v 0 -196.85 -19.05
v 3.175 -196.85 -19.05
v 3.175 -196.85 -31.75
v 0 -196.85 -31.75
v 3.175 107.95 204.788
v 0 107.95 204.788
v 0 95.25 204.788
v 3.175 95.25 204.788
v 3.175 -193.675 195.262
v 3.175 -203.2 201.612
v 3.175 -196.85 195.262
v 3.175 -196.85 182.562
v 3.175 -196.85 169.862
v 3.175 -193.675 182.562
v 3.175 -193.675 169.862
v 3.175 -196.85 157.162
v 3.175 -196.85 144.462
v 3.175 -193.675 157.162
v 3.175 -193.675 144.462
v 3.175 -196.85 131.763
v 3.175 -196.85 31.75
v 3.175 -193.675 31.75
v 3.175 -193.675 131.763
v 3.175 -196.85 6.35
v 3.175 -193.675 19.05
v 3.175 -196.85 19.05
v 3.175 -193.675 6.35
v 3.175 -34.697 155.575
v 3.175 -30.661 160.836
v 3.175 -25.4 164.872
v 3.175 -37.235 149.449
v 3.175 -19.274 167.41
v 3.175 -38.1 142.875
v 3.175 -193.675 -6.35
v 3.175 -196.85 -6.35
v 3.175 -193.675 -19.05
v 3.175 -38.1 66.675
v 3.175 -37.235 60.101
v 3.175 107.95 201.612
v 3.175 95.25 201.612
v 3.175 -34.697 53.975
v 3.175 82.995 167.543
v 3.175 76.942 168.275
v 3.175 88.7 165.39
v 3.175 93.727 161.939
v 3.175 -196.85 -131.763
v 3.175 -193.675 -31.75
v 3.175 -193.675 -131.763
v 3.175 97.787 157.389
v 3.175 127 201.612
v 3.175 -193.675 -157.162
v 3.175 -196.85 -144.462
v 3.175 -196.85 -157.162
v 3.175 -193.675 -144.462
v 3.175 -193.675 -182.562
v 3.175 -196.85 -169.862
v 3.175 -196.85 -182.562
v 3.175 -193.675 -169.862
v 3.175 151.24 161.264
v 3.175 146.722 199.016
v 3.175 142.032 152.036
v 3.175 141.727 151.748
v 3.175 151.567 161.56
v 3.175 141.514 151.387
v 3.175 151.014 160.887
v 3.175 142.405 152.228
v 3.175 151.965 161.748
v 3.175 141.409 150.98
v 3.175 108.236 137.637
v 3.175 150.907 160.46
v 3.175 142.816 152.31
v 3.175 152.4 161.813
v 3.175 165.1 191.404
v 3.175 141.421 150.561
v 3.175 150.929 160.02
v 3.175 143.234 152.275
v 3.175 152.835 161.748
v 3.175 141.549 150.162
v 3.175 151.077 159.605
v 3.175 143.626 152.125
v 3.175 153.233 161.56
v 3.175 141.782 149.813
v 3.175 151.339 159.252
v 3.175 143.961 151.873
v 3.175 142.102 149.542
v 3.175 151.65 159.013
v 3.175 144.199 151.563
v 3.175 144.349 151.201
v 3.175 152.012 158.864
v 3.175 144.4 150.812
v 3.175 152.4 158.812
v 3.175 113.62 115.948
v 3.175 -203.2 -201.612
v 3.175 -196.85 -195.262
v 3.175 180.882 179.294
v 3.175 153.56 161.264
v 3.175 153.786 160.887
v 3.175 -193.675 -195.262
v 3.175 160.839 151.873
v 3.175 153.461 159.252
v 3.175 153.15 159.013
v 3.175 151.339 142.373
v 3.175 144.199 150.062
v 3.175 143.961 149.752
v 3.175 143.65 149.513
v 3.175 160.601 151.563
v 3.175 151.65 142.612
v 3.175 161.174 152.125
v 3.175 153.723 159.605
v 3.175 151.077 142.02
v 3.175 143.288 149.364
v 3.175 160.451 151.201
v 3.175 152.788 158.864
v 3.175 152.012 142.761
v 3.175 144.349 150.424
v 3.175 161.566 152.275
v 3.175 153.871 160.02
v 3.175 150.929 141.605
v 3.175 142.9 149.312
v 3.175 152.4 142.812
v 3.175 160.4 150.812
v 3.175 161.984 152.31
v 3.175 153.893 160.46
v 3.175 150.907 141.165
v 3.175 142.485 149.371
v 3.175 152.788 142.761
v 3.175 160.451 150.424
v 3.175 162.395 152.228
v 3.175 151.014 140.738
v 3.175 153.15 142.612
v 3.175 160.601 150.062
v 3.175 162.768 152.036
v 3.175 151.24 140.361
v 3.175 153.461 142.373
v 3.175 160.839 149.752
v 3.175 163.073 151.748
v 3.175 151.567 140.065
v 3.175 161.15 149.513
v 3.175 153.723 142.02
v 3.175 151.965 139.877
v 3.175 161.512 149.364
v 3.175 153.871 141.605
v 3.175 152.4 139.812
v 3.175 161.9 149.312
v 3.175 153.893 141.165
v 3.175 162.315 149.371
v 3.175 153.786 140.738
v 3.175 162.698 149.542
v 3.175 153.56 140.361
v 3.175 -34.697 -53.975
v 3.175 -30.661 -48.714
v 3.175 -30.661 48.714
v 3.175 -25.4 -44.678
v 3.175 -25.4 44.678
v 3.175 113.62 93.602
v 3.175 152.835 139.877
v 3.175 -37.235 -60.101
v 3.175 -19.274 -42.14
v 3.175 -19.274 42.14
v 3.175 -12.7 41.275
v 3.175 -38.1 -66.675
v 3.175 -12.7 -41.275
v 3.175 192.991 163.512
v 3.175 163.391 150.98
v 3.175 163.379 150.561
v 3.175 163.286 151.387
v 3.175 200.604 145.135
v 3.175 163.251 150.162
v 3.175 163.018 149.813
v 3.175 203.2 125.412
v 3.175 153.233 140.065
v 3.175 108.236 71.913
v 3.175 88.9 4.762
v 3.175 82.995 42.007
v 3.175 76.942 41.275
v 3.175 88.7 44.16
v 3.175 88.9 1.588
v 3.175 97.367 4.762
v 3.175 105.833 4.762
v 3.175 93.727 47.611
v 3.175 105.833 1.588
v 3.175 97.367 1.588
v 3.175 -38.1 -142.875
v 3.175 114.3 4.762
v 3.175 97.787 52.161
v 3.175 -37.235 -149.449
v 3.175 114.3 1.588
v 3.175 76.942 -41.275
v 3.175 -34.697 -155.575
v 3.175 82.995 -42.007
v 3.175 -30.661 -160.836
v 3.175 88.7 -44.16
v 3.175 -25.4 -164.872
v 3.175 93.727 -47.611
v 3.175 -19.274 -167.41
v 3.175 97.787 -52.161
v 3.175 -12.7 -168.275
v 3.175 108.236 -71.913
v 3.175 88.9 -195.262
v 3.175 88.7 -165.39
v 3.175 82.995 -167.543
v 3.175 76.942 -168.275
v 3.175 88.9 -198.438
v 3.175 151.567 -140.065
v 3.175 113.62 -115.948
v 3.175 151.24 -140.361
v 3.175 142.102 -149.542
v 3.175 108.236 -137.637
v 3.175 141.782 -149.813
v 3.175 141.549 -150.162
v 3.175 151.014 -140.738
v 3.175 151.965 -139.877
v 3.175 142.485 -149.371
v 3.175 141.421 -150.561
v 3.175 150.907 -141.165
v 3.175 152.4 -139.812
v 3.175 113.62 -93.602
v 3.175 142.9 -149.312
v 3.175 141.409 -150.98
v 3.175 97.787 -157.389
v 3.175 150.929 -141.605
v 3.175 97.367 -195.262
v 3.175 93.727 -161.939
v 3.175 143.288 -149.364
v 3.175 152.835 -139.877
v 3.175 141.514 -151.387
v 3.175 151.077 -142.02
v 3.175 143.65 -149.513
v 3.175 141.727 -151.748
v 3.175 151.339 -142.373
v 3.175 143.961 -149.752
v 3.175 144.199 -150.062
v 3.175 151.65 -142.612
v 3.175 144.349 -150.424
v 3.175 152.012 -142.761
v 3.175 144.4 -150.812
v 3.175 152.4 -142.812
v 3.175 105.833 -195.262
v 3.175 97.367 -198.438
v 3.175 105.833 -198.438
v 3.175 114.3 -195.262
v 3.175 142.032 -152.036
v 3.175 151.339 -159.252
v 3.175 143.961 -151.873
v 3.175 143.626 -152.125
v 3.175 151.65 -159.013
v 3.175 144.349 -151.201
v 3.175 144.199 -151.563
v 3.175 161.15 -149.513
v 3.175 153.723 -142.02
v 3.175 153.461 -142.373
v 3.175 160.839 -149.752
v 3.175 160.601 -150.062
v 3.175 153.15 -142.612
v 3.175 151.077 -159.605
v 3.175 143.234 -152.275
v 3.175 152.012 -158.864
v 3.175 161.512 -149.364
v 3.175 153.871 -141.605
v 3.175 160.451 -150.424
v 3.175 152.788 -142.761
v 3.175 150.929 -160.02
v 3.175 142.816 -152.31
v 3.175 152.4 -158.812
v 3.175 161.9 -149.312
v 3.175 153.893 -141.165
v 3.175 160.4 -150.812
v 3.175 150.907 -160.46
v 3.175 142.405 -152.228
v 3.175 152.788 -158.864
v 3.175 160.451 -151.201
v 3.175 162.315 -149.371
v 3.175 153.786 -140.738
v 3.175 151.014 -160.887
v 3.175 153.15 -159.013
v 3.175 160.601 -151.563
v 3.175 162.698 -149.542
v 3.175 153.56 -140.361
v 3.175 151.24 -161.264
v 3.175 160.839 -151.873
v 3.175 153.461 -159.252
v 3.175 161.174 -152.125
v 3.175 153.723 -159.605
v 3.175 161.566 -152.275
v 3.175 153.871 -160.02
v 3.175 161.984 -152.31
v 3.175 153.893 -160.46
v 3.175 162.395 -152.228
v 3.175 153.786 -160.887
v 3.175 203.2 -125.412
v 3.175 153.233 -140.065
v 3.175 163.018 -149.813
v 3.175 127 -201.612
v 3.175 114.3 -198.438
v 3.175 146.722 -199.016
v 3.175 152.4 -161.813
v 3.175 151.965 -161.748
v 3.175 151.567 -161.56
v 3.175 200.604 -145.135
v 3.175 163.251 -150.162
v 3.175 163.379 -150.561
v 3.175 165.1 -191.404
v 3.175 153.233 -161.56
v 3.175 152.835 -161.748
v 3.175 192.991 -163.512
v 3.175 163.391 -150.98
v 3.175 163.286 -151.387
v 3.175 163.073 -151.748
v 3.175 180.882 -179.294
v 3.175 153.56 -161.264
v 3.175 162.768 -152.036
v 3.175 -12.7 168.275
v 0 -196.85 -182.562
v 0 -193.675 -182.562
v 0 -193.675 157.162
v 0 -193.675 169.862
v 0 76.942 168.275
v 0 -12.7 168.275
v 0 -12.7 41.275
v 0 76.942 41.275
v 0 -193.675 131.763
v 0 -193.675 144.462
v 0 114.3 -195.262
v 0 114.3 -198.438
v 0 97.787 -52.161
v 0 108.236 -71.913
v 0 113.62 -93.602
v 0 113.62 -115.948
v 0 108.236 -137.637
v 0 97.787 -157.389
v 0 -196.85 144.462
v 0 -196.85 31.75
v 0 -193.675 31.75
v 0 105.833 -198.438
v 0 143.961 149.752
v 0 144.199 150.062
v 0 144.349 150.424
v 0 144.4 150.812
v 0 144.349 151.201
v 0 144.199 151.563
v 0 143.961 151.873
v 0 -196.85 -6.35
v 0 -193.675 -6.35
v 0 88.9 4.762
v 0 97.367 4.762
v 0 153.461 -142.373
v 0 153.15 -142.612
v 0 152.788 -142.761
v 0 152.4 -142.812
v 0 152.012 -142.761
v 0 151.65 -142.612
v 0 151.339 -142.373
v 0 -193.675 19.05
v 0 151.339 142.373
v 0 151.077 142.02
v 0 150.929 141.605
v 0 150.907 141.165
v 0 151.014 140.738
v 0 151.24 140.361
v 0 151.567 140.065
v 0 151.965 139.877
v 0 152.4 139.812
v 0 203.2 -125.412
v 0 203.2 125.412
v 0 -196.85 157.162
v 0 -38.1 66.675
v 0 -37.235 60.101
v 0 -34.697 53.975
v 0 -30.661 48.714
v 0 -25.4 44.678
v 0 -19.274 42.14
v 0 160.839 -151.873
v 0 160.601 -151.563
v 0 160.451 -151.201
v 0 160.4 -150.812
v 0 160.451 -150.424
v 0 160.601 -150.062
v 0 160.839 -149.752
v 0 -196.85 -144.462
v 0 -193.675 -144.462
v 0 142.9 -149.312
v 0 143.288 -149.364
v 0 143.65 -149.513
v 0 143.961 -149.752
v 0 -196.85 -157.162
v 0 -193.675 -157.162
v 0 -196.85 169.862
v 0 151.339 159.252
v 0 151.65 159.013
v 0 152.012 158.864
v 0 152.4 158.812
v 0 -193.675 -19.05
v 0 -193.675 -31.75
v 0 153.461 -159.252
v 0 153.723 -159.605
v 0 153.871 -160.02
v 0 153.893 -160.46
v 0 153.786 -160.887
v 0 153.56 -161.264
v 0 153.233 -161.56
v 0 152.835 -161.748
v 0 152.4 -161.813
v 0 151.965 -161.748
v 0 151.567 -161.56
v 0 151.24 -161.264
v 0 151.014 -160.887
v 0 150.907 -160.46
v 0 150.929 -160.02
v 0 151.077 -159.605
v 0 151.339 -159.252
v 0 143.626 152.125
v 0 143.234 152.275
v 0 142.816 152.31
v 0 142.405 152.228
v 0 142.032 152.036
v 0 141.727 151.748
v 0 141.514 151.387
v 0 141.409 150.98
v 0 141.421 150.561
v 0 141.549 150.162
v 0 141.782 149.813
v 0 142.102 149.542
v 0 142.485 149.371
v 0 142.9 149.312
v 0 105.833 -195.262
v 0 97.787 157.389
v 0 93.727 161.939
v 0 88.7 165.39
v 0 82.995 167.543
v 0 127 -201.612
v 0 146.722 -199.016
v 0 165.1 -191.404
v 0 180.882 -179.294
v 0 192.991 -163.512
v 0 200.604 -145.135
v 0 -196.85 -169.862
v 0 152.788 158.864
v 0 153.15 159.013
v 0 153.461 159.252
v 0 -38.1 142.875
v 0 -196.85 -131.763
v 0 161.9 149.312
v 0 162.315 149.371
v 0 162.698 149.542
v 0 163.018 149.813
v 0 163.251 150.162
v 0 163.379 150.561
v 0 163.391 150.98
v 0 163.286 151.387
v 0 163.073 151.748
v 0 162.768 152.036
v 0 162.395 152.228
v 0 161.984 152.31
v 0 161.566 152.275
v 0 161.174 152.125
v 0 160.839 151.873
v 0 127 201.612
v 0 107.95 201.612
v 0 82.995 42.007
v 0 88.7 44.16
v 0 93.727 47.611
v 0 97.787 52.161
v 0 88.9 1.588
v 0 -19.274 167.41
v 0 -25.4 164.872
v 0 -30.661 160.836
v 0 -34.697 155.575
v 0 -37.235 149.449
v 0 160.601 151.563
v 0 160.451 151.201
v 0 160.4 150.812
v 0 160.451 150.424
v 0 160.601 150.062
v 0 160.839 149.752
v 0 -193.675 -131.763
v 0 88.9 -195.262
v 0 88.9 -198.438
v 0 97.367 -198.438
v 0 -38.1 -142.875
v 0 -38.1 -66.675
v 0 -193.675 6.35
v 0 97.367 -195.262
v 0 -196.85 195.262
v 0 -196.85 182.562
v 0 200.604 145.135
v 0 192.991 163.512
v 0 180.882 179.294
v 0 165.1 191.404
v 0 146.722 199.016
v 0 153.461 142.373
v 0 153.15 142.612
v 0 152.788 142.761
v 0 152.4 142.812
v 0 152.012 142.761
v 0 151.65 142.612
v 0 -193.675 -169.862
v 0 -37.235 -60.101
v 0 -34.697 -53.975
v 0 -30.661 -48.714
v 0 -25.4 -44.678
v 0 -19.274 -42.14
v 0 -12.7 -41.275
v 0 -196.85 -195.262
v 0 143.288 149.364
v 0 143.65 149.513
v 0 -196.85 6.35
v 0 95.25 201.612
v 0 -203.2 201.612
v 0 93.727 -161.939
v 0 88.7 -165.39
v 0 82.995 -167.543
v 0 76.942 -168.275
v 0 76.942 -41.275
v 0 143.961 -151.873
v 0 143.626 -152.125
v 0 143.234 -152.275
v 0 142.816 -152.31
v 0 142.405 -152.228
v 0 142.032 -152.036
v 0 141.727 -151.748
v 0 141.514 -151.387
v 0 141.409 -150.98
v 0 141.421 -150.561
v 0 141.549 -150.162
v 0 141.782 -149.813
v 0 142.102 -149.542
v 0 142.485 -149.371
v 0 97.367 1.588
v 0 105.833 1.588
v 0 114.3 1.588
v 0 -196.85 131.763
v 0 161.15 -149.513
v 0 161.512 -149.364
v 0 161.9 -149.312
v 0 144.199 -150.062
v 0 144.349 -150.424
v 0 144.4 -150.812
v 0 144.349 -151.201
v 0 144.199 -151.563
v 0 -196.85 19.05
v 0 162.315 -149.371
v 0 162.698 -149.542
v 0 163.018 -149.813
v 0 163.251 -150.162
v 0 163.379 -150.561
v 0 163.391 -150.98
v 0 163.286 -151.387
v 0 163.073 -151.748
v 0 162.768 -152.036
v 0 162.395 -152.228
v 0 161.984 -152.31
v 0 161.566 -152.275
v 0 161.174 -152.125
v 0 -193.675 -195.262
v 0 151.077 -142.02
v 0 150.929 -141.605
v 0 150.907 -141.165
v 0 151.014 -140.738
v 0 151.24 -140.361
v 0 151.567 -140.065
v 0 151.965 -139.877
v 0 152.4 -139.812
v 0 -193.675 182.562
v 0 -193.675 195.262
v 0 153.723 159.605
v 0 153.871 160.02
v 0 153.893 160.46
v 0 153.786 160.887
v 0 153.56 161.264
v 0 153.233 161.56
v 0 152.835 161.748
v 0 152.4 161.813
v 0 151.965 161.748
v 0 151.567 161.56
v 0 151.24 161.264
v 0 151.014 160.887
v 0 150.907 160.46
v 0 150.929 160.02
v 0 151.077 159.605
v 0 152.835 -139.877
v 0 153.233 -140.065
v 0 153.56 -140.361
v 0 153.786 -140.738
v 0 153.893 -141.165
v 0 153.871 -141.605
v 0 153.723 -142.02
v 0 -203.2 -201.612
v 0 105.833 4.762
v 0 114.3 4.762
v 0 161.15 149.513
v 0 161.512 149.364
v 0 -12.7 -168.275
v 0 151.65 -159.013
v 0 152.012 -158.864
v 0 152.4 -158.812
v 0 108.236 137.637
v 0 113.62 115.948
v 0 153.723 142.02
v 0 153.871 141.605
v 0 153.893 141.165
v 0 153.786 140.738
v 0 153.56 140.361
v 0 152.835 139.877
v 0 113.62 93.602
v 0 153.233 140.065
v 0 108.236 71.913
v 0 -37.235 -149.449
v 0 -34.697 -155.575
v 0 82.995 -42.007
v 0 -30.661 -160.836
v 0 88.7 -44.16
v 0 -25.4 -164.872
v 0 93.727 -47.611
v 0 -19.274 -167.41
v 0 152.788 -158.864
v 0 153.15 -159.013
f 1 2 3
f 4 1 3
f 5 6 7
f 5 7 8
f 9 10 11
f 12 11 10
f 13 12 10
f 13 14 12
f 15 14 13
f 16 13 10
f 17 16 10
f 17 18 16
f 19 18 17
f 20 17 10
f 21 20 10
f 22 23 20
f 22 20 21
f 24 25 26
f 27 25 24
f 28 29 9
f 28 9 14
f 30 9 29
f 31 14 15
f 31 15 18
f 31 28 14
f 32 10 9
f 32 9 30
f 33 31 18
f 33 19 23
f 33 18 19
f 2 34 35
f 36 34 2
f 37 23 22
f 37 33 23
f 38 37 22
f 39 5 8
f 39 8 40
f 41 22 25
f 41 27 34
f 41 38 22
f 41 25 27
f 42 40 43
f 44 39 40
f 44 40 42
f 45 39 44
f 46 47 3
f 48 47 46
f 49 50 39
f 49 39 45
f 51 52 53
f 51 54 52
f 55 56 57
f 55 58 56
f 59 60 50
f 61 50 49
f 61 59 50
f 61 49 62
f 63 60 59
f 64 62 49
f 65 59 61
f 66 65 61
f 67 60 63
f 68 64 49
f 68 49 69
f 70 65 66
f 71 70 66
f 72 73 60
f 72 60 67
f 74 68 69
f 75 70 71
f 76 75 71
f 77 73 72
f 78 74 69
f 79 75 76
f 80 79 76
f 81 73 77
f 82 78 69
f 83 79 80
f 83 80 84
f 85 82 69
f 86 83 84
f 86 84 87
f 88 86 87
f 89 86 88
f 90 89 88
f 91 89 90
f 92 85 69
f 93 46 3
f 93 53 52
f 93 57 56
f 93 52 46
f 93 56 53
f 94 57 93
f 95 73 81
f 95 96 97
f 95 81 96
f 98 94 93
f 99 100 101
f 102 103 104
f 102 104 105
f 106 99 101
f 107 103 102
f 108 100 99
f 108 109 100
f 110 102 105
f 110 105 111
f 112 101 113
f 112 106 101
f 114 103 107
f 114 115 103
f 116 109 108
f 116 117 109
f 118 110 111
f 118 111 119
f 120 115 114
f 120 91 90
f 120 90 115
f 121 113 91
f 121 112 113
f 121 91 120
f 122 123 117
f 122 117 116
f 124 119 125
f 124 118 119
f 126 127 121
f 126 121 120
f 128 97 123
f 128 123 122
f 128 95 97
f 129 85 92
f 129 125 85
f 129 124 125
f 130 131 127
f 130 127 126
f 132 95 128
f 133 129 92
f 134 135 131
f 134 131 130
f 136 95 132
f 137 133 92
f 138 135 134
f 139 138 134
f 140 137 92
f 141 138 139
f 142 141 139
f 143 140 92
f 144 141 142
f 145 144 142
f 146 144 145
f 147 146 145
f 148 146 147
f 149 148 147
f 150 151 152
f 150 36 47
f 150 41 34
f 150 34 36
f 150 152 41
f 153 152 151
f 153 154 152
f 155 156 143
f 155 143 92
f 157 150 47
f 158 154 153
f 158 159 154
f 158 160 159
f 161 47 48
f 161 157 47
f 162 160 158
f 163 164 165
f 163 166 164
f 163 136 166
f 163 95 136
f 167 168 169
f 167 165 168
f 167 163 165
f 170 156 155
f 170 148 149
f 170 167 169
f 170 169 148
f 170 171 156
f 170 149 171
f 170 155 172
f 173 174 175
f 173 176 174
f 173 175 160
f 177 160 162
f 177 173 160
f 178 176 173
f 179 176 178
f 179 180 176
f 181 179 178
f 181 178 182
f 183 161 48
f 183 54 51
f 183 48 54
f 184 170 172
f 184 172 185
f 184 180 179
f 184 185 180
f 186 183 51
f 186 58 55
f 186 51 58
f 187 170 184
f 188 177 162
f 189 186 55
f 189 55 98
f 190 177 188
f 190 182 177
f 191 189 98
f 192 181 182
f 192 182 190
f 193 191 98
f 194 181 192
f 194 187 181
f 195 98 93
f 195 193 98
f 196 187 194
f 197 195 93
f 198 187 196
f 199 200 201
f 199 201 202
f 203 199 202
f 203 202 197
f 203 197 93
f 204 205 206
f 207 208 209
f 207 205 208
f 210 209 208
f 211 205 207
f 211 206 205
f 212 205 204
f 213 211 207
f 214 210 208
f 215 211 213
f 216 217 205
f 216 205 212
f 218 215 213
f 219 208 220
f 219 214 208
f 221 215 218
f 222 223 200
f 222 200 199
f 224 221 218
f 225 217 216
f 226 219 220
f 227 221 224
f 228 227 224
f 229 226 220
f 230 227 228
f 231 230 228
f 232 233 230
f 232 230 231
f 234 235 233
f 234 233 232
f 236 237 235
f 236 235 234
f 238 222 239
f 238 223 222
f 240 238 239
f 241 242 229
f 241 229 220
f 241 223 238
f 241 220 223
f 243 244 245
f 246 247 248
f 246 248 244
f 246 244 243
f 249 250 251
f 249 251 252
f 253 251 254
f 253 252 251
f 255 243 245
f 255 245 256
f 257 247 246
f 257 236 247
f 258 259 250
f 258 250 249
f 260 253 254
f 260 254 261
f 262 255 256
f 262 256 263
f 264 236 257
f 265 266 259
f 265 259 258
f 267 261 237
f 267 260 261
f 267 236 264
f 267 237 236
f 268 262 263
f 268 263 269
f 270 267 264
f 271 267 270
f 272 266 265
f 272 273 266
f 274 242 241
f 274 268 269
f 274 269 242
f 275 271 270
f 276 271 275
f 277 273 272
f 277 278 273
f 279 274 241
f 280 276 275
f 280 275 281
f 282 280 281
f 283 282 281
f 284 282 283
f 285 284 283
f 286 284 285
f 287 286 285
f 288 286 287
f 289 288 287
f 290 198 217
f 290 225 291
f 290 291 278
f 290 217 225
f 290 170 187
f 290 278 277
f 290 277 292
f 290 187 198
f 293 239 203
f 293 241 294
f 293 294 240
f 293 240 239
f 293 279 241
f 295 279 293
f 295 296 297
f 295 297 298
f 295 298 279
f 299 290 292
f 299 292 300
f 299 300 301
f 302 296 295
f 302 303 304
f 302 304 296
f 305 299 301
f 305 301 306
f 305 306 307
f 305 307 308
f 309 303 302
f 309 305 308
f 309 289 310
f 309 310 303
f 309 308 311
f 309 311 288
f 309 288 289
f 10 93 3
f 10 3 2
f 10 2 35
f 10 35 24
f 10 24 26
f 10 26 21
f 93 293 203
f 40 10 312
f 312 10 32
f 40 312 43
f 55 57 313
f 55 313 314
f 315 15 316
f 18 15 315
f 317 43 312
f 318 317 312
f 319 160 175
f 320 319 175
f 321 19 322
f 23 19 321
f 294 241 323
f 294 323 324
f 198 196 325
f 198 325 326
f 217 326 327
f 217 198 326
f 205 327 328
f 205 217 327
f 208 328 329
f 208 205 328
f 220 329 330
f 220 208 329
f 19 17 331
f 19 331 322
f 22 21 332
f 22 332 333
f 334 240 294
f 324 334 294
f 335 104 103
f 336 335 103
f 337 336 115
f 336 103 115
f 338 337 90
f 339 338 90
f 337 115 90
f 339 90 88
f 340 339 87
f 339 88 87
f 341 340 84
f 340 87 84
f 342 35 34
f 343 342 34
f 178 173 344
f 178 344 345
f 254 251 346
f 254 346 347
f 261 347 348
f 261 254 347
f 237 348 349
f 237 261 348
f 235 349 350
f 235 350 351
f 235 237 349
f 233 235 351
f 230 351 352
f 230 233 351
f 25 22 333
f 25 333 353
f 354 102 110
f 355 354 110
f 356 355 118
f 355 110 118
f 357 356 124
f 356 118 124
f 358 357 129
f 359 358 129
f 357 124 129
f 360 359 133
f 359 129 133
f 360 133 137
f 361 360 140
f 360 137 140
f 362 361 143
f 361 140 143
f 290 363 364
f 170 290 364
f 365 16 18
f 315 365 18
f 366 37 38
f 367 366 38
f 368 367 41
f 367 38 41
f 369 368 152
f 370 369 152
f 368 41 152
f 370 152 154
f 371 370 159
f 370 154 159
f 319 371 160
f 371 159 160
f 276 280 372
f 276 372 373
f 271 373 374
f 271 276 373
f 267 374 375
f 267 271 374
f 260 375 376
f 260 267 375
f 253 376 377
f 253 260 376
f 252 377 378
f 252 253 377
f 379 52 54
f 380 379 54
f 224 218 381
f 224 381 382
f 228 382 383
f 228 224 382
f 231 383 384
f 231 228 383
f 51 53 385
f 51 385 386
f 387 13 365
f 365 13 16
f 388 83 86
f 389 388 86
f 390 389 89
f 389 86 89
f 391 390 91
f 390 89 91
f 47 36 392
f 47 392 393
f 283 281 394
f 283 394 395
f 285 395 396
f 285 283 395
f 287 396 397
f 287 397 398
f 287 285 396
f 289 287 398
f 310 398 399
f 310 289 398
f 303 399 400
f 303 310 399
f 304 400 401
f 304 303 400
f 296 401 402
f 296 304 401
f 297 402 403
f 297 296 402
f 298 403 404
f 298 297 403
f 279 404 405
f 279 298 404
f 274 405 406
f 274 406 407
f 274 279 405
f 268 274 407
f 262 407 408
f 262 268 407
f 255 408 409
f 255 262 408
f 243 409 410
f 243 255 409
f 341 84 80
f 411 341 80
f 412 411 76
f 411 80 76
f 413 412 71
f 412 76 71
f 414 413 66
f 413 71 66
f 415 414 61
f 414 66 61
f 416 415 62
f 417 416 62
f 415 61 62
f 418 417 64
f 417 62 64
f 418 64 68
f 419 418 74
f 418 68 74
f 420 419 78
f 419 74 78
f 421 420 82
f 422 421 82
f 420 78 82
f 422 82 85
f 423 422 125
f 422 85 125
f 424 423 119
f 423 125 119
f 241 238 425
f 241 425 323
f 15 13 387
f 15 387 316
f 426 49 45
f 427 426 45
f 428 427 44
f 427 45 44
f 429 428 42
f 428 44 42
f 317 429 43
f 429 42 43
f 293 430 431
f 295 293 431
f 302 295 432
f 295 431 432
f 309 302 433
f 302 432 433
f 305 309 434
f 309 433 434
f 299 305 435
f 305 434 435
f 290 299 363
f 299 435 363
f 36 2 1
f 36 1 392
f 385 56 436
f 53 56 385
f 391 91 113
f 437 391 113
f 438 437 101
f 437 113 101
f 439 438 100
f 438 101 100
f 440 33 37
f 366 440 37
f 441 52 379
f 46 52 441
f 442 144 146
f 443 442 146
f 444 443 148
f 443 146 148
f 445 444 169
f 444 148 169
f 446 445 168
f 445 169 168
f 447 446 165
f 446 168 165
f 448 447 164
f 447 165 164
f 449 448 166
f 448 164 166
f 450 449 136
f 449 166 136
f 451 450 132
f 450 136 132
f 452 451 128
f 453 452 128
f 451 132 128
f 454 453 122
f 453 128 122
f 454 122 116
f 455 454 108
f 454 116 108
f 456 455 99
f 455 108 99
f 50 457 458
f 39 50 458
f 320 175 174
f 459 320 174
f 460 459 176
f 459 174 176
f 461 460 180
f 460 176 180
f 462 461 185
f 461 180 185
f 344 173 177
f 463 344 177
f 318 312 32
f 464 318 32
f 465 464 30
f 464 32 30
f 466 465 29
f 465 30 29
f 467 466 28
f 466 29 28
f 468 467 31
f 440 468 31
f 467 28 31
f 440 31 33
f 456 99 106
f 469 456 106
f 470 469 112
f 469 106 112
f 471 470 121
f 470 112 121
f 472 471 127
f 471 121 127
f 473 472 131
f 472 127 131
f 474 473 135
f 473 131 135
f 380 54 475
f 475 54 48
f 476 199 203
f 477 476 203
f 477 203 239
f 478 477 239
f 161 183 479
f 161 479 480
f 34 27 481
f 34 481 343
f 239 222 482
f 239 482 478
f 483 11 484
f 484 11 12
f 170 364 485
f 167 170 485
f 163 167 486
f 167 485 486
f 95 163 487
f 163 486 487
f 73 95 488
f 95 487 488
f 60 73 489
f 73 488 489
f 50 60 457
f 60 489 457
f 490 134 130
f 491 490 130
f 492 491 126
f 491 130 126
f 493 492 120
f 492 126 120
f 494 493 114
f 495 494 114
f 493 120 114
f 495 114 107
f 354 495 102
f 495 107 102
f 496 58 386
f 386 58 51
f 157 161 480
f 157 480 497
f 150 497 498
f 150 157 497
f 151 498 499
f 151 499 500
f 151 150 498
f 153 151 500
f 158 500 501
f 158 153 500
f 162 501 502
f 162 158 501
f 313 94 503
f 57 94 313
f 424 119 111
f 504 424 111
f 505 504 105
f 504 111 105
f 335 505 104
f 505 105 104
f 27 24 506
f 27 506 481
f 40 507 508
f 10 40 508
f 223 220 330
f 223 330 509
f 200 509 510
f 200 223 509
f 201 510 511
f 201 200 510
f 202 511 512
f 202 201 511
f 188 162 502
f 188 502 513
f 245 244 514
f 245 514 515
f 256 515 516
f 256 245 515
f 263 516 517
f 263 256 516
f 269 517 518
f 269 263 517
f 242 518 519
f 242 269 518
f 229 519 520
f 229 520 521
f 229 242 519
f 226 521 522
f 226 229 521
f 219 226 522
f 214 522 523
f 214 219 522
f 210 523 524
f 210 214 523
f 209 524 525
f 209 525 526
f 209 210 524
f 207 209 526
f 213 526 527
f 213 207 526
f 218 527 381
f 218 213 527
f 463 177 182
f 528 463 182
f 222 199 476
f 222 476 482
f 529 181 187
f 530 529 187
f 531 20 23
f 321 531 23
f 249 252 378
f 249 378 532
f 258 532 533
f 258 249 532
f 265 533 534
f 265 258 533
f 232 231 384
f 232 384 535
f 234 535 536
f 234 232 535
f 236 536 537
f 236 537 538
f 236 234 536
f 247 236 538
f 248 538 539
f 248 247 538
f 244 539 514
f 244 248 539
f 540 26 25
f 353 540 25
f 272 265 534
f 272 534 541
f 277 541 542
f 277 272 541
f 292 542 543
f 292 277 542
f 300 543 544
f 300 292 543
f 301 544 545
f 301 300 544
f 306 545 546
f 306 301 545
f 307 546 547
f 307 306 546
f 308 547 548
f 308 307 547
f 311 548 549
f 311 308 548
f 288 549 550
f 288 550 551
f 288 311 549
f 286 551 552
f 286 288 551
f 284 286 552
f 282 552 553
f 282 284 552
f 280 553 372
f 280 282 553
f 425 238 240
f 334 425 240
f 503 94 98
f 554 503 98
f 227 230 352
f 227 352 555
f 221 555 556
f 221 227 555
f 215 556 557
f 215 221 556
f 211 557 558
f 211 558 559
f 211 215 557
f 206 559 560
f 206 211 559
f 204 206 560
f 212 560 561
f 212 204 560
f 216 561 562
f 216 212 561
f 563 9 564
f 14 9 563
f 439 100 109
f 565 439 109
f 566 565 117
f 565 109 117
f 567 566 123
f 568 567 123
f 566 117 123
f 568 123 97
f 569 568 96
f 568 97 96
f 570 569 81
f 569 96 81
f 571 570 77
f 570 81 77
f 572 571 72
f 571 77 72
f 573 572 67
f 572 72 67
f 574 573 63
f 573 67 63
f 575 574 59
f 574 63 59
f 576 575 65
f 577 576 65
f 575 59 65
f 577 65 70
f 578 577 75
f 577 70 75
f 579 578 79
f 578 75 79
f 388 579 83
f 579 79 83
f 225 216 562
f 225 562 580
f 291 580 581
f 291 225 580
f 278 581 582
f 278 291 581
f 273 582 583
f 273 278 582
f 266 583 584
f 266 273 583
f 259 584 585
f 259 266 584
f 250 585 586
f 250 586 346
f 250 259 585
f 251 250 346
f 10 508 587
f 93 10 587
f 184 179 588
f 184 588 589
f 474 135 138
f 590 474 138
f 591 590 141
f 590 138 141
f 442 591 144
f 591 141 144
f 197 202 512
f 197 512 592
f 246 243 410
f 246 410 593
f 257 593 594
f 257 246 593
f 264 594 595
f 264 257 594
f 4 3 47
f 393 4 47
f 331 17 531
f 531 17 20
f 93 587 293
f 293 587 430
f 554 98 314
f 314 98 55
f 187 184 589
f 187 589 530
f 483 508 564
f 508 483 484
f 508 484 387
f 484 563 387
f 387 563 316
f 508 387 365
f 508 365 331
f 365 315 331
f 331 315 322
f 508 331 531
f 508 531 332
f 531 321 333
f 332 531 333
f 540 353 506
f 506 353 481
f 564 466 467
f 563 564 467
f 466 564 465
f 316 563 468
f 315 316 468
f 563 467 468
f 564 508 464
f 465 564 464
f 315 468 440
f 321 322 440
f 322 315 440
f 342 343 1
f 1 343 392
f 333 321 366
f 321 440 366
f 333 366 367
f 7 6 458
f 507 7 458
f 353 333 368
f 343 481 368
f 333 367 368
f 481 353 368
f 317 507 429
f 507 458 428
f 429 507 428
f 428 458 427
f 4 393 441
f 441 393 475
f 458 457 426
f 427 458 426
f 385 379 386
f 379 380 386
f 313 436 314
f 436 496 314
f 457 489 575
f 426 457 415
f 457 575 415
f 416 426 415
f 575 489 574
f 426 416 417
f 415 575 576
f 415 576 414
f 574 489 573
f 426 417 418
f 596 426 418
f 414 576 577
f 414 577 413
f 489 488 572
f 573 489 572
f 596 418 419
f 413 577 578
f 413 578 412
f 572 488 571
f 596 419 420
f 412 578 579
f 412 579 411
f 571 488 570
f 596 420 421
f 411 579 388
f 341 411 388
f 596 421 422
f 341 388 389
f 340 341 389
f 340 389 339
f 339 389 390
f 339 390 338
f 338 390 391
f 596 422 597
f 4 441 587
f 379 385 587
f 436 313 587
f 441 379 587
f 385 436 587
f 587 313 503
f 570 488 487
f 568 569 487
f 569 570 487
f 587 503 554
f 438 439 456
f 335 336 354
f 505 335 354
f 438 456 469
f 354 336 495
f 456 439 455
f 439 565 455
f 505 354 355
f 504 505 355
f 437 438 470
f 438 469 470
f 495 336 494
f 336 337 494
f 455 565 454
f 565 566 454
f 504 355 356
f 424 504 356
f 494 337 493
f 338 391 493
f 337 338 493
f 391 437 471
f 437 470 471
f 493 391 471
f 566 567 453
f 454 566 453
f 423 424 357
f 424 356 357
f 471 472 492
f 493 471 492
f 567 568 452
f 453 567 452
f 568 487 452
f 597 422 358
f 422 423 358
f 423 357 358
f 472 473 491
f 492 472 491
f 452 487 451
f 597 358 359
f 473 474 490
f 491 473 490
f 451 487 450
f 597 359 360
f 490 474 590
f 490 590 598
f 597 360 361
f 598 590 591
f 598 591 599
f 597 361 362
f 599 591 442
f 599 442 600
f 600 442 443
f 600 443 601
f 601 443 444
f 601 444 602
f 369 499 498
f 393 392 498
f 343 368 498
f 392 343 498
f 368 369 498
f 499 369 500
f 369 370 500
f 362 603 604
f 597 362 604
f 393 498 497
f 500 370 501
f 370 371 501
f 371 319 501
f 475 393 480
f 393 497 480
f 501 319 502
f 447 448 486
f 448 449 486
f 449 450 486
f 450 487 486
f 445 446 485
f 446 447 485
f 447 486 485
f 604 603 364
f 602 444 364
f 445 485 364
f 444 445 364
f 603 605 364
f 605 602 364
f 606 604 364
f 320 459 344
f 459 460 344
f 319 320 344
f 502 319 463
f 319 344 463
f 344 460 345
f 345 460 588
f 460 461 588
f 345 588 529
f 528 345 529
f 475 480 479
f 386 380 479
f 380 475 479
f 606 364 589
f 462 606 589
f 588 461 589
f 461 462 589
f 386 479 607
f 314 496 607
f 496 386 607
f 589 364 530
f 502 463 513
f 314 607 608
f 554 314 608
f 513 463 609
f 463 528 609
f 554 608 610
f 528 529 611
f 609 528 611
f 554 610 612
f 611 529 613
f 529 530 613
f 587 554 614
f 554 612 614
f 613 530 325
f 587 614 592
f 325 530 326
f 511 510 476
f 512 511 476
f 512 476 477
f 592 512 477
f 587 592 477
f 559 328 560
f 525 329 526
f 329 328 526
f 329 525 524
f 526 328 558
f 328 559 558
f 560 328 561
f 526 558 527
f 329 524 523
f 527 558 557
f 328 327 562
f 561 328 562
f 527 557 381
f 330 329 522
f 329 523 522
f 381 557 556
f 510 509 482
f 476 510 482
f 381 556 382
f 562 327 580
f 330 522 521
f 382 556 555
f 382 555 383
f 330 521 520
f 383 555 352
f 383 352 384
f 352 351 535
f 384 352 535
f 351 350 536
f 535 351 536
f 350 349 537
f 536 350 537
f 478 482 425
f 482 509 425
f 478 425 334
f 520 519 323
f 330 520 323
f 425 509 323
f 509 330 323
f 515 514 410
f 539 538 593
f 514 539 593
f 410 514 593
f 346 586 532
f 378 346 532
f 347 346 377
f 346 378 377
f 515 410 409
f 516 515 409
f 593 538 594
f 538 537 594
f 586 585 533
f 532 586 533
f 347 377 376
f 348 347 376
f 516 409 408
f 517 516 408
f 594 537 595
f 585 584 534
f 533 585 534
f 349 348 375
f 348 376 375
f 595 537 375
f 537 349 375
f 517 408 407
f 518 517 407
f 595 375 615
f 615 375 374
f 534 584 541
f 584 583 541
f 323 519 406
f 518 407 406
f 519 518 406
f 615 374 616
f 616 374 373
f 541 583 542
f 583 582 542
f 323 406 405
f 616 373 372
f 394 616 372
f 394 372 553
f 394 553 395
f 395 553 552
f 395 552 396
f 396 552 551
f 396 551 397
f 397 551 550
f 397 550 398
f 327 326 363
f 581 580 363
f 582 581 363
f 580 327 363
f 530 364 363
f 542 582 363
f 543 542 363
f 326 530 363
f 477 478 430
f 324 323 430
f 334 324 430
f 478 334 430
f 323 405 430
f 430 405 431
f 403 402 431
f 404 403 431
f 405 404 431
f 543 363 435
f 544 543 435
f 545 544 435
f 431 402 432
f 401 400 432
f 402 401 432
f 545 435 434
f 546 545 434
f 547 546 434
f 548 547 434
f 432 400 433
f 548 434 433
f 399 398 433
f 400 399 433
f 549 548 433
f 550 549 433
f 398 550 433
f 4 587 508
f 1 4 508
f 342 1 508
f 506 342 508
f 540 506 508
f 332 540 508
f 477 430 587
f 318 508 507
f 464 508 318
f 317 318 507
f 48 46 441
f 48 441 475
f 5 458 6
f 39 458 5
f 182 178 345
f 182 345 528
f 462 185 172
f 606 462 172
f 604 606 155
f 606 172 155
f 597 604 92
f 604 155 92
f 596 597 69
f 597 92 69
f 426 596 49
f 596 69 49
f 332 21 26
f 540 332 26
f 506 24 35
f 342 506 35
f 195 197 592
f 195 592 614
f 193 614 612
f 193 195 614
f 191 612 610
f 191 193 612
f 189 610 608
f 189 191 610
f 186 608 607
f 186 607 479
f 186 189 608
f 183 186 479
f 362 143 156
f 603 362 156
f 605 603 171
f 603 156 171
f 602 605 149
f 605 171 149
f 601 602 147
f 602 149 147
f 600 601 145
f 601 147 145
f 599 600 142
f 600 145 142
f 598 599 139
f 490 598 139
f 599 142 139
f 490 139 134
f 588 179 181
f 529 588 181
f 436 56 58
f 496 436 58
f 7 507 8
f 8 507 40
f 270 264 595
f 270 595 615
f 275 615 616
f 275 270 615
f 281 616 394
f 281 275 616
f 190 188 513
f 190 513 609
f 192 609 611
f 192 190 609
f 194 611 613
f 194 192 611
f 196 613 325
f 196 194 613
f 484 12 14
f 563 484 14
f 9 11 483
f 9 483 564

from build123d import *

# Parameters (mm, degrees)
BOSS_EXTRUDE1_DEPTH = 3.175
SKETCH2_W           = 3.175
SKETCH2_H           = 8.466666667
CUT_EXTRUDE1_DEPTH  = 3.175
SKETCH3_W           = 3.175
SKETCH3_H           = 12.7
BOSS_EXTRUDE2_DEPTH = 3.175
CUT_EXTRUDE2_DEPTH  = 3.175
SKETCH5_W           = 12.7
SKETCH5_H           = 3.175
CUT_EXTRUDE3_DEPTH  = 3.175
SKETCH6_W           = 12.7
SKETCH6_H           = 3.175
CUT_EXTRUDE4_DEPTH  = 3.175
CUT_EXTRUDE5_DEPTH  = 3.175


with BuildPart() as part:
    # Sketch1 → Boss-Extrude1 (new body)
    with BuildSketch(Plane(origin=(0, 0, 0), x_dir=(0, 0, -1), z_dir=(1, 0, 0))):
        with BuildLine():
            Line((-201.6125, -203.2), (201.6125, -203.2))
            Line((201.6125, -203.2), (201.6125, 127))
            ThreePointArc((201.6125, 127), (179.294036726, 180.881536726), (125.4125, 203.2))
            Line((125.4125, 203.2), (-125.4125, 203.2))
            ThreePointArc((-125.4125, 203.2), (-179.294036726, 180.881536726), (-201.6125, 127))
            Line((-201.6125, 127), (-201.6125, -203.2))
        make_face()
    extrude(amount=BOSS_EXTRUDE1_DEPTH)

    # Sketch2 → Cut-Extrude1 (cut)
    with BuildSketch(Plane(origin=(3.175, 0, 0), x_dir=(0, 0, -1), z_dir=(1, 0, 0))):
        with Locations((-3.175, 110.066666667)):
            Rectangle(SKETCH2_W, SKETCH2_H)
        with Locations((196.85, 110.066666667)):
            Rectangle(SKETCH2_W, SKETCH2_H)
        with Locations((196.85, 93.133333334)):
            Rectangle(SKETCH2_W, SKETCH2_H)
        with Locations((-3.175, 93.133333334)):
            Rectangle(SKETCH2_W, SKETCH2_H)
    extrude(amount=-CUT_EXTRUDE1_DEPTH, mode=Mode.SUBTRACT)

    # Sketch3 → Boss-Extrude2 (add)
    with BuildSketch(Plane.XY.offset(201.6125)):
        with Locations((1.5875, 101.6)):
            Rectangle(SKETCH3_W, SKETCH3_H)
    extrude(amount=BOSS_EXTRUDE2_DEPTH)

    # Sketch4 → Cut-Extrude2 (cut)
    with BuildSketch(Plane(origin=(3.175, 0, 0), x_dir=(0, 0, -1), z_dir=(1, 0, 0))):
        with BuildLine():
            Line((-168.275, 76.941959208), (-168.275, -12.7))
            ThreePointArc((-168.275, -12.7), (-160.835512242, -30.660512242), (-142.875, -38.1))
            Line((-142.875, -38.1), (-66.675, -38.1))
            ThreePointArc((-66.675, -38.1), (-48.714487758, -30.660512242), (-41.275, -12.7))
            Line((-41.275, -12.7), (-41.275, 76.941959208))
            ThreePointArc((-41.275, 76.941959208), (-44.160306385, 88.699874475), (-52.160714286, 97.786515097))
            ThreePointArc((-52.160714286, 97.786515097), (-104.775, 114.3), (-157.389285714, 97.786515097))
            ThreePointArc((-157.389285714, 97.786515097), (-165.389693615, 88.699874475), (-168.275, 76.941959208))
        make_face()
        with BuildLine():
            Line((168.275, 76.941959208), (168.275, -12.7))
            ThreePointArc((168.275, -12.7), (160.835512242, -30.660512242), (142.875, -38.1))
            Line((142.875, -38.1), (66.675, -38.1))
            ThreePointArc((66.675, -38.1), (48.714487758, -30.660512242), (41.275, -12.7))
            Line((41.275, -12.7), (41.275, 76.941959208))
            ThreePointArc((41.275, 76.941959208), (44.160306385, 88.699874475), (52.160714286, 97.786515097))
            ThreePointArc((52.160714286, 97.786515097), (104.775, 114.3), (157.389285714, 97.786515097))
            ThreePointArc((157.389285714, 97.786515097), (165.389693615, 88.699874475), (168.275, 76.941959208))
        make_face()
    extrude(amount=-CUT_EXTRUDE2_DEPTH, mode=Mode.SUBTRACT)

    # Sketch5 → Cut-Extrude3 (cut)
    with BuildSketch(Plane(origin=(3.175, 0, 0), x_dir=(0, 0, -1), z_dir=(1, 0, 0))):
        with Locations((-188.9125, -195.2625)):
            Rectangle(SKETCH5_W, SKETCH5_H)
        with Locations((-163.5125, -195.2625)):
            Rectangle(SKETCH5_W, SKETCH5_H)
        with Locations((-138.1125, -195.2625)):
            Rectangle(SKETCH5_W, SKETCH5_H)
    cut_extrude3 = extrude(amount=-CUT_EXTRUDE3_DEPTH, mode=Mode.SUBTRACT)

    # Mirror1: Cut-Extrude3 across plane
    add(cut_extrude3.mirror(Plane.XY), mode=Mode.SUBTRACT)

    # Sketch6 → Cut-Extrude4 (cut)
    with BuildSketch(Plane(origin=(3.175, 0, 0), x_dir=(0, 0, -1), z_dir=(1, 0, 0))):
        with Locations((-25.4, -195.2625)):
            Rectangle(SKETCH6_W, SKETCH6_H)
        with Locations((0, -195.2625)):
            Rectangle(SKETCH6_W, SKETCH6_H)
        with Locations((25.4, -195.2625)):
            Rectangle(SKETCH6_W, SKETCH6_H)
    extrude(amount=-CUT_EXTRUDE4_DEPTH, mode=Mode.SUBTRACT)

    # Sketch7 → Cut-Extrude5 (cut)
    with BuildSketch(Plane(origin=(3.175, 0, 0), x_dir=(0, 0, -1), z_dir=(1, 0, 0))):
        with BuildLine():
            ThreePointArc((-158.8125, 152.4), (-158.926680701, 152.974025149), (-159.251839828, 153.460660172))
            Line((-159.251839828, 153.460660172), (-160.3125, 152.4))
            Line((-160.3125, 152.4), (-159.251839828, 151.339339828))
            ThreePointArc((-159.251839828, 151.339339828), (-158.926680701, 151.825974851), (-158.8125, 152.4))
        make_face()
        with BuildLine():
            Line((-160.3125, 152.4), (-159.251839828, 153.460660172))
            ThreePointArc((-159.251839828, 153.460660172), (-161.8125, 152.4), (-159.251839828, 151.339339828))
            Line((-159.251839828, 151.339339828), (-160.3125, 152.4))
        make_face()
        with BuildLine():
            Line((-149.751839828, 160.839339828), (-150.8125, 161.9))
            Line((-150.8125, 161.9), (-151.873160172, 160.839339828))
            ThreePointArc((-151.873160172, 160.839339828), (-150.8125, 160.4), (-149.751839828, 160.839339828))
        make_face()
        with BuildLine():
            Line((-151.873160172, 160.839339828), (-150.8125, 161.9))
            Line((-150.8125, 161.9), (-149.751839828, 160.839339828))
            ThreePointArc((-149.751839828, 160.839339828), (-149.426680701, 161.325974851), (-149.3125, 161.9))
            ThreePointArc((-149.3125, 161.9), (-151.386525149, 163.285819299), (-151.873160172, 160.839339828))
        make_face()
        with BuildLine():
            ThreePointArc((-139.8125, 152.4), (-140.738474851, 153.785819299), (-142.373160172, 153.460660172))
            Line((-142.373160172, 153.460660172), (-141.3125, 152.4))
            Line((-141.3125, 152.4), (-142.373160172, 151.339339828))
            ThreePointArc((-142.373160172, 151.339339828), (-140.738474851, 151.014180701), (-139.8125, 152.4))
        make_face()
        with BuildLine():
            Line((-141.3125, 152.4), (-142.373160172, 153.460660172))
            ThreePointArc((-142.373160172, 153.460660172), (-142.8125, 152.4), (-142.373160172, 151.339339828))
            Line((-142.373160172, 151.339339828), (-141.3125, 152.4))
        make_face()
        with BuildLine():
            ThreePointArc((-149.751839828, 143.960660172), (-150.8125, 144.4), (-151.873160172, 143.960660172))
            Line((-151.873160172, 143.960660172), (-150.8125, 142.9))
            Line((-150.8125, 142.9), (-149.751839828, 143.960660172))
        make_face()
        with BuildLine():
            Line((-150.8125, 142.9), (-151.873160172, 143.960660172))
            ThreePointArc((-151.873160172, 143.960660172), (-151.386525149, 141.514180701), (-149.3125, 142.9))
            ThreePointArc((-149.3125, 142.9), (-149.426680701, 143.474025149), (-149.751839828, 143.960660172))
            Line((-149.751839828, 143.960660172), (-150.8125, 142.9))
        make_face()
    cut_extrude5 = extrude(amount=-CUT_EXTRUDE5_DEPTH, mode=Mode.SUBTRACT)

    # Mirror2: Cut-Extrude5 across plane
    add(cut_extrude5.mirror(Plane.XY), mode=Mode.SUBTRACT)


solid = part.part
